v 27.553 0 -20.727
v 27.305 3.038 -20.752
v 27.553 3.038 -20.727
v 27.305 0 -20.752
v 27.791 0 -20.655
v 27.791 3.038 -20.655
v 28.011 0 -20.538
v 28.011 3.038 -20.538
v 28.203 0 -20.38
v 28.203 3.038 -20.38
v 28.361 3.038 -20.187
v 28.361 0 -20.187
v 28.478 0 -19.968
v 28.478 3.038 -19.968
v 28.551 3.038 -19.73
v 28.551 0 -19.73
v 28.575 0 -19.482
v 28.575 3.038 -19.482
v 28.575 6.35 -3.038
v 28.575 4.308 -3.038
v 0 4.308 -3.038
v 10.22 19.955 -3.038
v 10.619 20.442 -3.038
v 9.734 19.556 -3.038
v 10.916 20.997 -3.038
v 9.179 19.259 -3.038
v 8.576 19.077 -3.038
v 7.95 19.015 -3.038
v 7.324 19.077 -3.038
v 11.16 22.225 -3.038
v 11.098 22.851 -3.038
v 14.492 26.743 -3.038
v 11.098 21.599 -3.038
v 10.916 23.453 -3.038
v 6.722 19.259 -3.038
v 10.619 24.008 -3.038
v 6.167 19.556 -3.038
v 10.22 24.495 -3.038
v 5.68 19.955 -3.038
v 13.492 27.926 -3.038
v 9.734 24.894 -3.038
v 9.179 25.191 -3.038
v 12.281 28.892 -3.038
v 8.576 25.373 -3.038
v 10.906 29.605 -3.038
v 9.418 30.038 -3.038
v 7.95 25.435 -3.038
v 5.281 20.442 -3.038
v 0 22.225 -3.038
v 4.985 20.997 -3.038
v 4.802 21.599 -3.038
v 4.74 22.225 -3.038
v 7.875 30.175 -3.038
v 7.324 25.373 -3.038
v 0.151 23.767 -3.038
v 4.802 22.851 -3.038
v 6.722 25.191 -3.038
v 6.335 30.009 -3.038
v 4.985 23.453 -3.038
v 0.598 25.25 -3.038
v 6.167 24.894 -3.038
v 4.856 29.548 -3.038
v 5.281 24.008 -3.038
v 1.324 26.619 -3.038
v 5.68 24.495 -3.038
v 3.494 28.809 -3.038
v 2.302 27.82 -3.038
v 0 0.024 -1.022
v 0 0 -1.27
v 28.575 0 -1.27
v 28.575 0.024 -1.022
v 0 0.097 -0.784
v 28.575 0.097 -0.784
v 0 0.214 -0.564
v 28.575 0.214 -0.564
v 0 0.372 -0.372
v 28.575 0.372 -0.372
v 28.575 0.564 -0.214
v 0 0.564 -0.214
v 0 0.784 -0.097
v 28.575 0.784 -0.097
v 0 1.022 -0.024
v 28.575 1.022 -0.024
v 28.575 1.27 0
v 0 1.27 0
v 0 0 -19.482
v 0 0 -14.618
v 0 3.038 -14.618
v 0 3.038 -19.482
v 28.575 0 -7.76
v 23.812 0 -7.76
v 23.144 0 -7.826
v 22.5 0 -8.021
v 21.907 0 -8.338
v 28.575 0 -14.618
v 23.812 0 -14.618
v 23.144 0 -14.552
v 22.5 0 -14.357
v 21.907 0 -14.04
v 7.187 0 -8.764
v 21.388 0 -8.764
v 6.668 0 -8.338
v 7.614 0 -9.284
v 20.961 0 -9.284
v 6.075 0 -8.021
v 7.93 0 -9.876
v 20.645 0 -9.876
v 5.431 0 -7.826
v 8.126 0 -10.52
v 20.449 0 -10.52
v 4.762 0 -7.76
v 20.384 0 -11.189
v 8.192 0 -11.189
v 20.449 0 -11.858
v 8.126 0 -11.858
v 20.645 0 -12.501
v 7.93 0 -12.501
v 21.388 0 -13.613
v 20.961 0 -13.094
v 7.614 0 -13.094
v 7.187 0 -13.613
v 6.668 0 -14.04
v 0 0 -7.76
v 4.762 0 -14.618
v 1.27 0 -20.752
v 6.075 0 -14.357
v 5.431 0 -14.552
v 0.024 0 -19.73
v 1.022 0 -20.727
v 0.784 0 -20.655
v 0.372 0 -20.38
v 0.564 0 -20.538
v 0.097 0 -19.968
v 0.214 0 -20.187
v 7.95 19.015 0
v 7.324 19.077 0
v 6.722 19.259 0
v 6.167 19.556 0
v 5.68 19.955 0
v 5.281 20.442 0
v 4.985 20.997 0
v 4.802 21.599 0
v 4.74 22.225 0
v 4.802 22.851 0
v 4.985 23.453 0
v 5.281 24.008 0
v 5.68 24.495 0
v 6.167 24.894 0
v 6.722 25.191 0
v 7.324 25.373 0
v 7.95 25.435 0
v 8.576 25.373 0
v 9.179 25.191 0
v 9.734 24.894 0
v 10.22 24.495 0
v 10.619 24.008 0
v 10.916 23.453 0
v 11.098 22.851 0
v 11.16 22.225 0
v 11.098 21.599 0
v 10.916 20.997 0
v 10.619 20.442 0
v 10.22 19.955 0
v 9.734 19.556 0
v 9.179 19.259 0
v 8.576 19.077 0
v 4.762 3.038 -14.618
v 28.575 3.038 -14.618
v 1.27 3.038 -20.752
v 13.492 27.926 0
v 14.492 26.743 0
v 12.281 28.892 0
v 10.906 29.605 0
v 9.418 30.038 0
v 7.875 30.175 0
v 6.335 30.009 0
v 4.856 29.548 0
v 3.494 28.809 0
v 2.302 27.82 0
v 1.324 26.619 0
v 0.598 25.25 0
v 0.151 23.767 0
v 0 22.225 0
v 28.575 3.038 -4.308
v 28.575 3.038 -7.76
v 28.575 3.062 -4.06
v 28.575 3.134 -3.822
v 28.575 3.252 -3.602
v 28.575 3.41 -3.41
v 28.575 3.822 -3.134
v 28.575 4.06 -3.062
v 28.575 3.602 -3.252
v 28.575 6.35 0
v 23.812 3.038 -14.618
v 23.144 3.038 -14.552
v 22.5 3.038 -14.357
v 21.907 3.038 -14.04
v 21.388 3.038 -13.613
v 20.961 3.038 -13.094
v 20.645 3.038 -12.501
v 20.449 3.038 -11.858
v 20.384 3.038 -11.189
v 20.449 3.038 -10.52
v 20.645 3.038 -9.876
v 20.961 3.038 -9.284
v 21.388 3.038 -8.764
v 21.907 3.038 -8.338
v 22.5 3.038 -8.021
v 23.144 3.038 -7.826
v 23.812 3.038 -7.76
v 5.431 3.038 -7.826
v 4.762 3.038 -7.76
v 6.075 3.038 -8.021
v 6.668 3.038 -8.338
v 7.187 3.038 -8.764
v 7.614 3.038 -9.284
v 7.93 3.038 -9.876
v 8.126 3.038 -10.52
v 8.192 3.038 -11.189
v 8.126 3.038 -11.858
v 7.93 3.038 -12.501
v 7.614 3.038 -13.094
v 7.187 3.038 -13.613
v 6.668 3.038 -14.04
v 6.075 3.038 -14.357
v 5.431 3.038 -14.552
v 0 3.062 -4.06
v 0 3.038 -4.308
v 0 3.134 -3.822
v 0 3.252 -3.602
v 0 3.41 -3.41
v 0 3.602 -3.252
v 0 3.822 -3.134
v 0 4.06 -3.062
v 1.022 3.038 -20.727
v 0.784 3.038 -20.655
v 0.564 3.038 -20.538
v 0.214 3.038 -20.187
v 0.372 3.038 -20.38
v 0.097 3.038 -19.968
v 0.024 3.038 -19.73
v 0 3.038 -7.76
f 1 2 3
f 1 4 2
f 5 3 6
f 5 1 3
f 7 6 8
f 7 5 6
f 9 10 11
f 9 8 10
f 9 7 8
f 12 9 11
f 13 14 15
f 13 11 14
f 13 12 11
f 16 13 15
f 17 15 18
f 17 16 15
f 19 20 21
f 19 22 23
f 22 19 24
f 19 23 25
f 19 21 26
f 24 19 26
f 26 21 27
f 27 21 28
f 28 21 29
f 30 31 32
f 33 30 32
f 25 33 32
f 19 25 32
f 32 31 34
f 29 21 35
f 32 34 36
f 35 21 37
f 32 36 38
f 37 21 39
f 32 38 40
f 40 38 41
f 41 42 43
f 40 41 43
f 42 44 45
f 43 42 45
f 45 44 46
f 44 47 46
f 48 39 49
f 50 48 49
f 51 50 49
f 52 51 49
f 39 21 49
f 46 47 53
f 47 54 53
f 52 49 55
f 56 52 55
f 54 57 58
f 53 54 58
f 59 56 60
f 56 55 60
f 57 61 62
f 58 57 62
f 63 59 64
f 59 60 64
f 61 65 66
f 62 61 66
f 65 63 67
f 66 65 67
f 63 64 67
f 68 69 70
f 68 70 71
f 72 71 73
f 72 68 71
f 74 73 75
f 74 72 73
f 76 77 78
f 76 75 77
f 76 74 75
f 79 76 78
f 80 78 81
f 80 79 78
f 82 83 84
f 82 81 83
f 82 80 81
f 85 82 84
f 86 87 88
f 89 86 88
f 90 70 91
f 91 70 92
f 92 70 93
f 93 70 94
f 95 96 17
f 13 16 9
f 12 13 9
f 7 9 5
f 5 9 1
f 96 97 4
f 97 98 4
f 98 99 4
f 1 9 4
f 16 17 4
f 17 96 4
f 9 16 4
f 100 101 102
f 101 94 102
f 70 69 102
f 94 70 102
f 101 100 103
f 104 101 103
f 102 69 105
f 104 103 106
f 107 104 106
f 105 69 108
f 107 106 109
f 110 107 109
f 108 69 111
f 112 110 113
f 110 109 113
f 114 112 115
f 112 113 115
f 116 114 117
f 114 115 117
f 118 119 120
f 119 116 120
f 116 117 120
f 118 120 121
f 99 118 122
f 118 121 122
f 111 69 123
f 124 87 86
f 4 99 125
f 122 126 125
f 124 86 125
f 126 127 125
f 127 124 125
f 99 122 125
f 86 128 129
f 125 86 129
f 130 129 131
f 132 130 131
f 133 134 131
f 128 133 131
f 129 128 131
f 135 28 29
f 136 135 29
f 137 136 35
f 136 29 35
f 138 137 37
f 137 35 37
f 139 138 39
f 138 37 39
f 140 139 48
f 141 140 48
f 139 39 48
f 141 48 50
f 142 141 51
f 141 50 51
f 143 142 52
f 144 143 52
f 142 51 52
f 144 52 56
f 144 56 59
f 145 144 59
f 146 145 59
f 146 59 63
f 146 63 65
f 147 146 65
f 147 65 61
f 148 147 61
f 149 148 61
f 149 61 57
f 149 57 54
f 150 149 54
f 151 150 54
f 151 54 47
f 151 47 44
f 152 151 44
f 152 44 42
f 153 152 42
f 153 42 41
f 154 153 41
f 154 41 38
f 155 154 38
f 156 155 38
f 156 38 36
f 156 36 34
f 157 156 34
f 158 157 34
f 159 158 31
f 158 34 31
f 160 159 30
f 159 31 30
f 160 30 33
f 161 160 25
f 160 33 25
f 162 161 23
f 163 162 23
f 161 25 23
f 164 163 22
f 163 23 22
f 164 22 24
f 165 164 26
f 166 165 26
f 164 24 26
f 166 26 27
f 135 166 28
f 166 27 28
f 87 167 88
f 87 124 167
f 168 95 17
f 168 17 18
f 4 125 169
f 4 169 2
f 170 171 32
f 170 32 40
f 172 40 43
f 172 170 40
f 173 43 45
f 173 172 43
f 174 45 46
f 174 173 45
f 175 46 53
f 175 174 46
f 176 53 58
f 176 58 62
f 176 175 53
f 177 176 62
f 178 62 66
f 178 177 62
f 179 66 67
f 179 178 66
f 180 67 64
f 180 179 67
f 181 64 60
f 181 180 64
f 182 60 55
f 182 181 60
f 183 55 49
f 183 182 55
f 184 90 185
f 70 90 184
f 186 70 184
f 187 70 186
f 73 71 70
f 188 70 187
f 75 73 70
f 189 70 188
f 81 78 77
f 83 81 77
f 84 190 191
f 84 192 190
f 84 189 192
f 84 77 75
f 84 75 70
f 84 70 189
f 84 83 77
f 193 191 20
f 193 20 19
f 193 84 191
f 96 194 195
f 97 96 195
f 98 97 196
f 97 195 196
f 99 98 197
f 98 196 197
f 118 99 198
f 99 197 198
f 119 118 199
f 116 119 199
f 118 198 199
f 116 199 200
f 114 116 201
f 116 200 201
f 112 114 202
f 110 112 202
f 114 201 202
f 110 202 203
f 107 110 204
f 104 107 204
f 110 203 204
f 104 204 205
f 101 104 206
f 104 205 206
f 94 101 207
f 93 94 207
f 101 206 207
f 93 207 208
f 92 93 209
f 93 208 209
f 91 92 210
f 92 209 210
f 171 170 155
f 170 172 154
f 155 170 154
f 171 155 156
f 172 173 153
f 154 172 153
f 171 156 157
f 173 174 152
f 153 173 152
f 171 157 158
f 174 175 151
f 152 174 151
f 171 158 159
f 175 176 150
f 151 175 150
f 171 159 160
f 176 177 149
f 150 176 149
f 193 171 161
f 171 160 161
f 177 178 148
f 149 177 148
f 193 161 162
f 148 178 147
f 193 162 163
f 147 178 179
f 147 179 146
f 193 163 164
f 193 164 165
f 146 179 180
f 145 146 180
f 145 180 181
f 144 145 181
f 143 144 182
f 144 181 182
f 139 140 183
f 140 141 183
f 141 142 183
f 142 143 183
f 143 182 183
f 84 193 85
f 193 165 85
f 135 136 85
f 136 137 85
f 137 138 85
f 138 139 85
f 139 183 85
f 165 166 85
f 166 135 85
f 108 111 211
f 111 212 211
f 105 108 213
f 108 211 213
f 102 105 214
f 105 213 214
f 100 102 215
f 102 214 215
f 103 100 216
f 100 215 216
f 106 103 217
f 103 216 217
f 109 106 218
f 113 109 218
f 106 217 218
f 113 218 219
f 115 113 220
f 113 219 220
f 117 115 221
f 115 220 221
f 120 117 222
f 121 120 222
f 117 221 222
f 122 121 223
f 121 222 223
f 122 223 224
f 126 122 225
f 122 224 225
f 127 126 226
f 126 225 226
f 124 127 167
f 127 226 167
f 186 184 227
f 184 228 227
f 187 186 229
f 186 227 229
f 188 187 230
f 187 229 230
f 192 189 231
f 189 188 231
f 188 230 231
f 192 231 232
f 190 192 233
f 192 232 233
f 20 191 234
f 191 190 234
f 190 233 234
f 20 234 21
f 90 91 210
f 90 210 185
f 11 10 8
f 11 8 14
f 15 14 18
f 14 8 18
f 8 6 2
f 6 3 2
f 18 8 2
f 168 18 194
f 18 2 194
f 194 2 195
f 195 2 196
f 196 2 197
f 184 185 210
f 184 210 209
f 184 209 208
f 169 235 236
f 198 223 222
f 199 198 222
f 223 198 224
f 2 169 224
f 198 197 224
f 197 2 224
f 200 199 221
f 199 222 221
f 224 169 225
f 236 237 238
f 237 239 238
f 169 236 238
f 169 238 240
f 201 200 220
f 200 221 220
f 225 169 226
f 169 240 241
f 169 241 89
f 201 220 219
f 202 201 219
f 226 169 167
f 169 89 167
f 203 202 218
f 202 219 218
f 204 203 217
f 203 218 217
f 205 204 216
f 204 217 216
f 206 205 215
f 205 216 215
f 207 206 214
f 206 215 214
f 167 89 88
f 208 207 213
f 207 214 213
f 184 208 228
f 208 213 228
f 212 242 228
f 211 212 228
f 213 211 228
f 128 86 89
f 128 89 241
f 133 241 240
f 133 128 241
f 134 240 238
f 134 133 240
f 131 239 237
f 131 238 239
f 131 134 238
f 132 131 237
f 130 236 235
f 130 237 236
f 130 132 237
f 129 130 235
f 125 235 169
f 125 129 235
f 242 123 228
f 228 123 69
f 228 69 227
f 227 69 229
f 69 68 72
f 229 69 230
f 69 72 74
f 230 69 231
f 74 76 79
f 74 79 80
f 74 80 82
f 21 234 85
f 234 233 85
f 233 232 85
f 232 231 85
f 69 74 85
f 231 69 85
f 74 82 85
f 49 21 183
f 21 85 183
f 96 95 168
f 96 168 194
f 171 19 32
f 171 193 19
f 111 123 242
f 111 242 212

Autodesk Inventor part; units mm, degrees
sketch "Sketch_1" plane through (0, 0, 0) normal (1, 0, 0) x (0, 1, 0)
  line L0 (30.226, 0) -> (1.27, 0)
  arc A0 (1.27, 0) -> (0, -1.27) centre (1.27, -1.27) ccw
  line L1 (0, -1.27) -> (0, -20.7518)
  line L2 (0, -20.7518) -> (3.0378, -20.7518)
  line L3 (3.0378, -20.7518) -> (3.0378, -4.3078)
  arc A1 (4.3078, -3.0378) -> (3.0378, -4.3078) centre (4.3078, -4.3078) ccw
  line L4 (4.3078, -3.0378) -> (30.226, -3.0378)
  line L5 (30.226, -3.0378) -> (30.226, 0)
extrude "Extrusion1" add sketch "Sketch_1" along normal blind 28.575
sketch "Sketch_2" plane through (0, 0, 0) normal (0, 0, 1) x (1, 0, 0)
  line L0 (-28.575, -30.226) -> (42.8625, -30.226)
  line L1 (42.8625, -30.226) -> (42.8625, 45.339)
  line L2 (42.8625, 45.339) -> (-28.575, 45.339)
  line L3 (-28.575, 45.339) -> (-28.575, -30.226)
  line L4 (0, 0) -> (28.575, 0)
  line L5 (28.575, 0) -> (28.575, 6.35)
  line L6 (28.575, 6.35) -> (14.4921, 26.7427)
  arc A0 (14.4921, 26.7427) -> (0, 22.225) centre (7.9502, 22.225) ccw
  line L7 (0, 22.225) -> (0, 0)
extrude "Extrusion2" cut sketch "Sketch_2" against normal blind 20.7518
sketch "Sketch3" plane through (0, 1.27, 0) normal (0, 0, 1) x (1, 0, 0)
  point P0 (7.9502, 20.955)
hole "Hole1" at (7.9502, 22.225, 0) direction (0, 0, -1) diameter 6.4198 depth 3.0378
sketch "Sketch4" plane through (0, 0, -20.7518) normal (0, -1, 0) x (1, 0, 0)
  point P0 (4.7625, 9.5631)
hole "Hole2" at (4.7625, 0, -11.1887) direction (0, 1, 0) diameter 6.858 depth 3.0378
sketch "Sketch5" plane through (0, 0, -20.7518) normal (0, -1, 0) x (1, 0, 0)
  point P0 (23.8125, 9.5631)
hole "Hole3" at (23.8125, 0, -11.1887) direction (0, 1, 0) diameter 6.858 depth 3.0378
sketch "Sketch_6" plane through (0, 0, 0) normal (0, 1, 0) x (-1, 0, 0)
  line L0 (0, -14.6177) -> (0, -7.7597)
  line L1 (0, -7.7597) -> (-4.7625, -7.7597)
  line L2 (-4.7625, -7.7597) -> (-4.7625, -14.6177)
  line L3 (-4.7625, -14.6177) -> (0, -14.6177)
sketch "Sketch_7" plane through (0, 0, 0) normal (0, 1, 0) x (-1, 0, 0)
  line L0 (-23.8125, -14.6177) -> (-23.8125, -7.7597)
  line L1 (-23.8125, -7.7597) -> (-28.575, -7.7597)
  line L2 (-28.575, -7.7597) -> (-28.575, -14.6177)
  line L3 (-28.575, -14.6177) -> (-23.8125, -14.6177)
extrude "Extrusion3" cut sketch "Sketch_6" along normal blind 3.0378
extrude "Extrusion4" cut sketch "Sketch_7" along normal blind 3.0378
sketch "Sketch_8" plane through (0, 0, 0) normal (0, 1, 0) x (-1, 0, 0)
  line L0 (0, -31.1277) -> (0, -19.4818)
  arc A0 (-1.27, -20.7518) -> (0, -19.4818) centre (-1.27, -19.4818) ccw
  line L1 (-1.27, -20.7518) -> (-27.305, -20.7518)
  arc A1 (-28.575, -19.4818) -> (-27.305, -20.7518) centre (-27.305, -19.4818) ccw
  line L2 (-28.575, -19.4818) -> (-28.575, -31.1277)
  line L3 (-28.575, -31.1277) -> (0, -31.1277)
extrude "Extrusion5" cut sketch "Sketch_8" along normal blind 3.0378
ref_plane "to_dummy_R_XY" through (0, 0, 0) normal (0, 0, 1) x (1, 0, 0)
ref_plane "to_dummy_R_YZ" through (0, 0, 0) normal (1, 0, 0) x (0, 1, 0)
ref_plane "to_dummy_R_ZX" through (0, 0, 0) normal (0, 1, 0) x (0, 0, 1)
ref_plane "to_pin_R_XY" through (7.9502, 22.225, 0) normal (0, 0, 1) x (1, 0, 0)
ref_plane "to_pin_R_YZ" through (7.9502, 22.225, 0) normal (1, 0, 0) x (0, 1, 0)
ref_plane "to_pin_R_ZX" through (7.9502, 22.225, 0) normal (0, 1, 0) x (0, 0, 1)
properties part number "D-9966"
